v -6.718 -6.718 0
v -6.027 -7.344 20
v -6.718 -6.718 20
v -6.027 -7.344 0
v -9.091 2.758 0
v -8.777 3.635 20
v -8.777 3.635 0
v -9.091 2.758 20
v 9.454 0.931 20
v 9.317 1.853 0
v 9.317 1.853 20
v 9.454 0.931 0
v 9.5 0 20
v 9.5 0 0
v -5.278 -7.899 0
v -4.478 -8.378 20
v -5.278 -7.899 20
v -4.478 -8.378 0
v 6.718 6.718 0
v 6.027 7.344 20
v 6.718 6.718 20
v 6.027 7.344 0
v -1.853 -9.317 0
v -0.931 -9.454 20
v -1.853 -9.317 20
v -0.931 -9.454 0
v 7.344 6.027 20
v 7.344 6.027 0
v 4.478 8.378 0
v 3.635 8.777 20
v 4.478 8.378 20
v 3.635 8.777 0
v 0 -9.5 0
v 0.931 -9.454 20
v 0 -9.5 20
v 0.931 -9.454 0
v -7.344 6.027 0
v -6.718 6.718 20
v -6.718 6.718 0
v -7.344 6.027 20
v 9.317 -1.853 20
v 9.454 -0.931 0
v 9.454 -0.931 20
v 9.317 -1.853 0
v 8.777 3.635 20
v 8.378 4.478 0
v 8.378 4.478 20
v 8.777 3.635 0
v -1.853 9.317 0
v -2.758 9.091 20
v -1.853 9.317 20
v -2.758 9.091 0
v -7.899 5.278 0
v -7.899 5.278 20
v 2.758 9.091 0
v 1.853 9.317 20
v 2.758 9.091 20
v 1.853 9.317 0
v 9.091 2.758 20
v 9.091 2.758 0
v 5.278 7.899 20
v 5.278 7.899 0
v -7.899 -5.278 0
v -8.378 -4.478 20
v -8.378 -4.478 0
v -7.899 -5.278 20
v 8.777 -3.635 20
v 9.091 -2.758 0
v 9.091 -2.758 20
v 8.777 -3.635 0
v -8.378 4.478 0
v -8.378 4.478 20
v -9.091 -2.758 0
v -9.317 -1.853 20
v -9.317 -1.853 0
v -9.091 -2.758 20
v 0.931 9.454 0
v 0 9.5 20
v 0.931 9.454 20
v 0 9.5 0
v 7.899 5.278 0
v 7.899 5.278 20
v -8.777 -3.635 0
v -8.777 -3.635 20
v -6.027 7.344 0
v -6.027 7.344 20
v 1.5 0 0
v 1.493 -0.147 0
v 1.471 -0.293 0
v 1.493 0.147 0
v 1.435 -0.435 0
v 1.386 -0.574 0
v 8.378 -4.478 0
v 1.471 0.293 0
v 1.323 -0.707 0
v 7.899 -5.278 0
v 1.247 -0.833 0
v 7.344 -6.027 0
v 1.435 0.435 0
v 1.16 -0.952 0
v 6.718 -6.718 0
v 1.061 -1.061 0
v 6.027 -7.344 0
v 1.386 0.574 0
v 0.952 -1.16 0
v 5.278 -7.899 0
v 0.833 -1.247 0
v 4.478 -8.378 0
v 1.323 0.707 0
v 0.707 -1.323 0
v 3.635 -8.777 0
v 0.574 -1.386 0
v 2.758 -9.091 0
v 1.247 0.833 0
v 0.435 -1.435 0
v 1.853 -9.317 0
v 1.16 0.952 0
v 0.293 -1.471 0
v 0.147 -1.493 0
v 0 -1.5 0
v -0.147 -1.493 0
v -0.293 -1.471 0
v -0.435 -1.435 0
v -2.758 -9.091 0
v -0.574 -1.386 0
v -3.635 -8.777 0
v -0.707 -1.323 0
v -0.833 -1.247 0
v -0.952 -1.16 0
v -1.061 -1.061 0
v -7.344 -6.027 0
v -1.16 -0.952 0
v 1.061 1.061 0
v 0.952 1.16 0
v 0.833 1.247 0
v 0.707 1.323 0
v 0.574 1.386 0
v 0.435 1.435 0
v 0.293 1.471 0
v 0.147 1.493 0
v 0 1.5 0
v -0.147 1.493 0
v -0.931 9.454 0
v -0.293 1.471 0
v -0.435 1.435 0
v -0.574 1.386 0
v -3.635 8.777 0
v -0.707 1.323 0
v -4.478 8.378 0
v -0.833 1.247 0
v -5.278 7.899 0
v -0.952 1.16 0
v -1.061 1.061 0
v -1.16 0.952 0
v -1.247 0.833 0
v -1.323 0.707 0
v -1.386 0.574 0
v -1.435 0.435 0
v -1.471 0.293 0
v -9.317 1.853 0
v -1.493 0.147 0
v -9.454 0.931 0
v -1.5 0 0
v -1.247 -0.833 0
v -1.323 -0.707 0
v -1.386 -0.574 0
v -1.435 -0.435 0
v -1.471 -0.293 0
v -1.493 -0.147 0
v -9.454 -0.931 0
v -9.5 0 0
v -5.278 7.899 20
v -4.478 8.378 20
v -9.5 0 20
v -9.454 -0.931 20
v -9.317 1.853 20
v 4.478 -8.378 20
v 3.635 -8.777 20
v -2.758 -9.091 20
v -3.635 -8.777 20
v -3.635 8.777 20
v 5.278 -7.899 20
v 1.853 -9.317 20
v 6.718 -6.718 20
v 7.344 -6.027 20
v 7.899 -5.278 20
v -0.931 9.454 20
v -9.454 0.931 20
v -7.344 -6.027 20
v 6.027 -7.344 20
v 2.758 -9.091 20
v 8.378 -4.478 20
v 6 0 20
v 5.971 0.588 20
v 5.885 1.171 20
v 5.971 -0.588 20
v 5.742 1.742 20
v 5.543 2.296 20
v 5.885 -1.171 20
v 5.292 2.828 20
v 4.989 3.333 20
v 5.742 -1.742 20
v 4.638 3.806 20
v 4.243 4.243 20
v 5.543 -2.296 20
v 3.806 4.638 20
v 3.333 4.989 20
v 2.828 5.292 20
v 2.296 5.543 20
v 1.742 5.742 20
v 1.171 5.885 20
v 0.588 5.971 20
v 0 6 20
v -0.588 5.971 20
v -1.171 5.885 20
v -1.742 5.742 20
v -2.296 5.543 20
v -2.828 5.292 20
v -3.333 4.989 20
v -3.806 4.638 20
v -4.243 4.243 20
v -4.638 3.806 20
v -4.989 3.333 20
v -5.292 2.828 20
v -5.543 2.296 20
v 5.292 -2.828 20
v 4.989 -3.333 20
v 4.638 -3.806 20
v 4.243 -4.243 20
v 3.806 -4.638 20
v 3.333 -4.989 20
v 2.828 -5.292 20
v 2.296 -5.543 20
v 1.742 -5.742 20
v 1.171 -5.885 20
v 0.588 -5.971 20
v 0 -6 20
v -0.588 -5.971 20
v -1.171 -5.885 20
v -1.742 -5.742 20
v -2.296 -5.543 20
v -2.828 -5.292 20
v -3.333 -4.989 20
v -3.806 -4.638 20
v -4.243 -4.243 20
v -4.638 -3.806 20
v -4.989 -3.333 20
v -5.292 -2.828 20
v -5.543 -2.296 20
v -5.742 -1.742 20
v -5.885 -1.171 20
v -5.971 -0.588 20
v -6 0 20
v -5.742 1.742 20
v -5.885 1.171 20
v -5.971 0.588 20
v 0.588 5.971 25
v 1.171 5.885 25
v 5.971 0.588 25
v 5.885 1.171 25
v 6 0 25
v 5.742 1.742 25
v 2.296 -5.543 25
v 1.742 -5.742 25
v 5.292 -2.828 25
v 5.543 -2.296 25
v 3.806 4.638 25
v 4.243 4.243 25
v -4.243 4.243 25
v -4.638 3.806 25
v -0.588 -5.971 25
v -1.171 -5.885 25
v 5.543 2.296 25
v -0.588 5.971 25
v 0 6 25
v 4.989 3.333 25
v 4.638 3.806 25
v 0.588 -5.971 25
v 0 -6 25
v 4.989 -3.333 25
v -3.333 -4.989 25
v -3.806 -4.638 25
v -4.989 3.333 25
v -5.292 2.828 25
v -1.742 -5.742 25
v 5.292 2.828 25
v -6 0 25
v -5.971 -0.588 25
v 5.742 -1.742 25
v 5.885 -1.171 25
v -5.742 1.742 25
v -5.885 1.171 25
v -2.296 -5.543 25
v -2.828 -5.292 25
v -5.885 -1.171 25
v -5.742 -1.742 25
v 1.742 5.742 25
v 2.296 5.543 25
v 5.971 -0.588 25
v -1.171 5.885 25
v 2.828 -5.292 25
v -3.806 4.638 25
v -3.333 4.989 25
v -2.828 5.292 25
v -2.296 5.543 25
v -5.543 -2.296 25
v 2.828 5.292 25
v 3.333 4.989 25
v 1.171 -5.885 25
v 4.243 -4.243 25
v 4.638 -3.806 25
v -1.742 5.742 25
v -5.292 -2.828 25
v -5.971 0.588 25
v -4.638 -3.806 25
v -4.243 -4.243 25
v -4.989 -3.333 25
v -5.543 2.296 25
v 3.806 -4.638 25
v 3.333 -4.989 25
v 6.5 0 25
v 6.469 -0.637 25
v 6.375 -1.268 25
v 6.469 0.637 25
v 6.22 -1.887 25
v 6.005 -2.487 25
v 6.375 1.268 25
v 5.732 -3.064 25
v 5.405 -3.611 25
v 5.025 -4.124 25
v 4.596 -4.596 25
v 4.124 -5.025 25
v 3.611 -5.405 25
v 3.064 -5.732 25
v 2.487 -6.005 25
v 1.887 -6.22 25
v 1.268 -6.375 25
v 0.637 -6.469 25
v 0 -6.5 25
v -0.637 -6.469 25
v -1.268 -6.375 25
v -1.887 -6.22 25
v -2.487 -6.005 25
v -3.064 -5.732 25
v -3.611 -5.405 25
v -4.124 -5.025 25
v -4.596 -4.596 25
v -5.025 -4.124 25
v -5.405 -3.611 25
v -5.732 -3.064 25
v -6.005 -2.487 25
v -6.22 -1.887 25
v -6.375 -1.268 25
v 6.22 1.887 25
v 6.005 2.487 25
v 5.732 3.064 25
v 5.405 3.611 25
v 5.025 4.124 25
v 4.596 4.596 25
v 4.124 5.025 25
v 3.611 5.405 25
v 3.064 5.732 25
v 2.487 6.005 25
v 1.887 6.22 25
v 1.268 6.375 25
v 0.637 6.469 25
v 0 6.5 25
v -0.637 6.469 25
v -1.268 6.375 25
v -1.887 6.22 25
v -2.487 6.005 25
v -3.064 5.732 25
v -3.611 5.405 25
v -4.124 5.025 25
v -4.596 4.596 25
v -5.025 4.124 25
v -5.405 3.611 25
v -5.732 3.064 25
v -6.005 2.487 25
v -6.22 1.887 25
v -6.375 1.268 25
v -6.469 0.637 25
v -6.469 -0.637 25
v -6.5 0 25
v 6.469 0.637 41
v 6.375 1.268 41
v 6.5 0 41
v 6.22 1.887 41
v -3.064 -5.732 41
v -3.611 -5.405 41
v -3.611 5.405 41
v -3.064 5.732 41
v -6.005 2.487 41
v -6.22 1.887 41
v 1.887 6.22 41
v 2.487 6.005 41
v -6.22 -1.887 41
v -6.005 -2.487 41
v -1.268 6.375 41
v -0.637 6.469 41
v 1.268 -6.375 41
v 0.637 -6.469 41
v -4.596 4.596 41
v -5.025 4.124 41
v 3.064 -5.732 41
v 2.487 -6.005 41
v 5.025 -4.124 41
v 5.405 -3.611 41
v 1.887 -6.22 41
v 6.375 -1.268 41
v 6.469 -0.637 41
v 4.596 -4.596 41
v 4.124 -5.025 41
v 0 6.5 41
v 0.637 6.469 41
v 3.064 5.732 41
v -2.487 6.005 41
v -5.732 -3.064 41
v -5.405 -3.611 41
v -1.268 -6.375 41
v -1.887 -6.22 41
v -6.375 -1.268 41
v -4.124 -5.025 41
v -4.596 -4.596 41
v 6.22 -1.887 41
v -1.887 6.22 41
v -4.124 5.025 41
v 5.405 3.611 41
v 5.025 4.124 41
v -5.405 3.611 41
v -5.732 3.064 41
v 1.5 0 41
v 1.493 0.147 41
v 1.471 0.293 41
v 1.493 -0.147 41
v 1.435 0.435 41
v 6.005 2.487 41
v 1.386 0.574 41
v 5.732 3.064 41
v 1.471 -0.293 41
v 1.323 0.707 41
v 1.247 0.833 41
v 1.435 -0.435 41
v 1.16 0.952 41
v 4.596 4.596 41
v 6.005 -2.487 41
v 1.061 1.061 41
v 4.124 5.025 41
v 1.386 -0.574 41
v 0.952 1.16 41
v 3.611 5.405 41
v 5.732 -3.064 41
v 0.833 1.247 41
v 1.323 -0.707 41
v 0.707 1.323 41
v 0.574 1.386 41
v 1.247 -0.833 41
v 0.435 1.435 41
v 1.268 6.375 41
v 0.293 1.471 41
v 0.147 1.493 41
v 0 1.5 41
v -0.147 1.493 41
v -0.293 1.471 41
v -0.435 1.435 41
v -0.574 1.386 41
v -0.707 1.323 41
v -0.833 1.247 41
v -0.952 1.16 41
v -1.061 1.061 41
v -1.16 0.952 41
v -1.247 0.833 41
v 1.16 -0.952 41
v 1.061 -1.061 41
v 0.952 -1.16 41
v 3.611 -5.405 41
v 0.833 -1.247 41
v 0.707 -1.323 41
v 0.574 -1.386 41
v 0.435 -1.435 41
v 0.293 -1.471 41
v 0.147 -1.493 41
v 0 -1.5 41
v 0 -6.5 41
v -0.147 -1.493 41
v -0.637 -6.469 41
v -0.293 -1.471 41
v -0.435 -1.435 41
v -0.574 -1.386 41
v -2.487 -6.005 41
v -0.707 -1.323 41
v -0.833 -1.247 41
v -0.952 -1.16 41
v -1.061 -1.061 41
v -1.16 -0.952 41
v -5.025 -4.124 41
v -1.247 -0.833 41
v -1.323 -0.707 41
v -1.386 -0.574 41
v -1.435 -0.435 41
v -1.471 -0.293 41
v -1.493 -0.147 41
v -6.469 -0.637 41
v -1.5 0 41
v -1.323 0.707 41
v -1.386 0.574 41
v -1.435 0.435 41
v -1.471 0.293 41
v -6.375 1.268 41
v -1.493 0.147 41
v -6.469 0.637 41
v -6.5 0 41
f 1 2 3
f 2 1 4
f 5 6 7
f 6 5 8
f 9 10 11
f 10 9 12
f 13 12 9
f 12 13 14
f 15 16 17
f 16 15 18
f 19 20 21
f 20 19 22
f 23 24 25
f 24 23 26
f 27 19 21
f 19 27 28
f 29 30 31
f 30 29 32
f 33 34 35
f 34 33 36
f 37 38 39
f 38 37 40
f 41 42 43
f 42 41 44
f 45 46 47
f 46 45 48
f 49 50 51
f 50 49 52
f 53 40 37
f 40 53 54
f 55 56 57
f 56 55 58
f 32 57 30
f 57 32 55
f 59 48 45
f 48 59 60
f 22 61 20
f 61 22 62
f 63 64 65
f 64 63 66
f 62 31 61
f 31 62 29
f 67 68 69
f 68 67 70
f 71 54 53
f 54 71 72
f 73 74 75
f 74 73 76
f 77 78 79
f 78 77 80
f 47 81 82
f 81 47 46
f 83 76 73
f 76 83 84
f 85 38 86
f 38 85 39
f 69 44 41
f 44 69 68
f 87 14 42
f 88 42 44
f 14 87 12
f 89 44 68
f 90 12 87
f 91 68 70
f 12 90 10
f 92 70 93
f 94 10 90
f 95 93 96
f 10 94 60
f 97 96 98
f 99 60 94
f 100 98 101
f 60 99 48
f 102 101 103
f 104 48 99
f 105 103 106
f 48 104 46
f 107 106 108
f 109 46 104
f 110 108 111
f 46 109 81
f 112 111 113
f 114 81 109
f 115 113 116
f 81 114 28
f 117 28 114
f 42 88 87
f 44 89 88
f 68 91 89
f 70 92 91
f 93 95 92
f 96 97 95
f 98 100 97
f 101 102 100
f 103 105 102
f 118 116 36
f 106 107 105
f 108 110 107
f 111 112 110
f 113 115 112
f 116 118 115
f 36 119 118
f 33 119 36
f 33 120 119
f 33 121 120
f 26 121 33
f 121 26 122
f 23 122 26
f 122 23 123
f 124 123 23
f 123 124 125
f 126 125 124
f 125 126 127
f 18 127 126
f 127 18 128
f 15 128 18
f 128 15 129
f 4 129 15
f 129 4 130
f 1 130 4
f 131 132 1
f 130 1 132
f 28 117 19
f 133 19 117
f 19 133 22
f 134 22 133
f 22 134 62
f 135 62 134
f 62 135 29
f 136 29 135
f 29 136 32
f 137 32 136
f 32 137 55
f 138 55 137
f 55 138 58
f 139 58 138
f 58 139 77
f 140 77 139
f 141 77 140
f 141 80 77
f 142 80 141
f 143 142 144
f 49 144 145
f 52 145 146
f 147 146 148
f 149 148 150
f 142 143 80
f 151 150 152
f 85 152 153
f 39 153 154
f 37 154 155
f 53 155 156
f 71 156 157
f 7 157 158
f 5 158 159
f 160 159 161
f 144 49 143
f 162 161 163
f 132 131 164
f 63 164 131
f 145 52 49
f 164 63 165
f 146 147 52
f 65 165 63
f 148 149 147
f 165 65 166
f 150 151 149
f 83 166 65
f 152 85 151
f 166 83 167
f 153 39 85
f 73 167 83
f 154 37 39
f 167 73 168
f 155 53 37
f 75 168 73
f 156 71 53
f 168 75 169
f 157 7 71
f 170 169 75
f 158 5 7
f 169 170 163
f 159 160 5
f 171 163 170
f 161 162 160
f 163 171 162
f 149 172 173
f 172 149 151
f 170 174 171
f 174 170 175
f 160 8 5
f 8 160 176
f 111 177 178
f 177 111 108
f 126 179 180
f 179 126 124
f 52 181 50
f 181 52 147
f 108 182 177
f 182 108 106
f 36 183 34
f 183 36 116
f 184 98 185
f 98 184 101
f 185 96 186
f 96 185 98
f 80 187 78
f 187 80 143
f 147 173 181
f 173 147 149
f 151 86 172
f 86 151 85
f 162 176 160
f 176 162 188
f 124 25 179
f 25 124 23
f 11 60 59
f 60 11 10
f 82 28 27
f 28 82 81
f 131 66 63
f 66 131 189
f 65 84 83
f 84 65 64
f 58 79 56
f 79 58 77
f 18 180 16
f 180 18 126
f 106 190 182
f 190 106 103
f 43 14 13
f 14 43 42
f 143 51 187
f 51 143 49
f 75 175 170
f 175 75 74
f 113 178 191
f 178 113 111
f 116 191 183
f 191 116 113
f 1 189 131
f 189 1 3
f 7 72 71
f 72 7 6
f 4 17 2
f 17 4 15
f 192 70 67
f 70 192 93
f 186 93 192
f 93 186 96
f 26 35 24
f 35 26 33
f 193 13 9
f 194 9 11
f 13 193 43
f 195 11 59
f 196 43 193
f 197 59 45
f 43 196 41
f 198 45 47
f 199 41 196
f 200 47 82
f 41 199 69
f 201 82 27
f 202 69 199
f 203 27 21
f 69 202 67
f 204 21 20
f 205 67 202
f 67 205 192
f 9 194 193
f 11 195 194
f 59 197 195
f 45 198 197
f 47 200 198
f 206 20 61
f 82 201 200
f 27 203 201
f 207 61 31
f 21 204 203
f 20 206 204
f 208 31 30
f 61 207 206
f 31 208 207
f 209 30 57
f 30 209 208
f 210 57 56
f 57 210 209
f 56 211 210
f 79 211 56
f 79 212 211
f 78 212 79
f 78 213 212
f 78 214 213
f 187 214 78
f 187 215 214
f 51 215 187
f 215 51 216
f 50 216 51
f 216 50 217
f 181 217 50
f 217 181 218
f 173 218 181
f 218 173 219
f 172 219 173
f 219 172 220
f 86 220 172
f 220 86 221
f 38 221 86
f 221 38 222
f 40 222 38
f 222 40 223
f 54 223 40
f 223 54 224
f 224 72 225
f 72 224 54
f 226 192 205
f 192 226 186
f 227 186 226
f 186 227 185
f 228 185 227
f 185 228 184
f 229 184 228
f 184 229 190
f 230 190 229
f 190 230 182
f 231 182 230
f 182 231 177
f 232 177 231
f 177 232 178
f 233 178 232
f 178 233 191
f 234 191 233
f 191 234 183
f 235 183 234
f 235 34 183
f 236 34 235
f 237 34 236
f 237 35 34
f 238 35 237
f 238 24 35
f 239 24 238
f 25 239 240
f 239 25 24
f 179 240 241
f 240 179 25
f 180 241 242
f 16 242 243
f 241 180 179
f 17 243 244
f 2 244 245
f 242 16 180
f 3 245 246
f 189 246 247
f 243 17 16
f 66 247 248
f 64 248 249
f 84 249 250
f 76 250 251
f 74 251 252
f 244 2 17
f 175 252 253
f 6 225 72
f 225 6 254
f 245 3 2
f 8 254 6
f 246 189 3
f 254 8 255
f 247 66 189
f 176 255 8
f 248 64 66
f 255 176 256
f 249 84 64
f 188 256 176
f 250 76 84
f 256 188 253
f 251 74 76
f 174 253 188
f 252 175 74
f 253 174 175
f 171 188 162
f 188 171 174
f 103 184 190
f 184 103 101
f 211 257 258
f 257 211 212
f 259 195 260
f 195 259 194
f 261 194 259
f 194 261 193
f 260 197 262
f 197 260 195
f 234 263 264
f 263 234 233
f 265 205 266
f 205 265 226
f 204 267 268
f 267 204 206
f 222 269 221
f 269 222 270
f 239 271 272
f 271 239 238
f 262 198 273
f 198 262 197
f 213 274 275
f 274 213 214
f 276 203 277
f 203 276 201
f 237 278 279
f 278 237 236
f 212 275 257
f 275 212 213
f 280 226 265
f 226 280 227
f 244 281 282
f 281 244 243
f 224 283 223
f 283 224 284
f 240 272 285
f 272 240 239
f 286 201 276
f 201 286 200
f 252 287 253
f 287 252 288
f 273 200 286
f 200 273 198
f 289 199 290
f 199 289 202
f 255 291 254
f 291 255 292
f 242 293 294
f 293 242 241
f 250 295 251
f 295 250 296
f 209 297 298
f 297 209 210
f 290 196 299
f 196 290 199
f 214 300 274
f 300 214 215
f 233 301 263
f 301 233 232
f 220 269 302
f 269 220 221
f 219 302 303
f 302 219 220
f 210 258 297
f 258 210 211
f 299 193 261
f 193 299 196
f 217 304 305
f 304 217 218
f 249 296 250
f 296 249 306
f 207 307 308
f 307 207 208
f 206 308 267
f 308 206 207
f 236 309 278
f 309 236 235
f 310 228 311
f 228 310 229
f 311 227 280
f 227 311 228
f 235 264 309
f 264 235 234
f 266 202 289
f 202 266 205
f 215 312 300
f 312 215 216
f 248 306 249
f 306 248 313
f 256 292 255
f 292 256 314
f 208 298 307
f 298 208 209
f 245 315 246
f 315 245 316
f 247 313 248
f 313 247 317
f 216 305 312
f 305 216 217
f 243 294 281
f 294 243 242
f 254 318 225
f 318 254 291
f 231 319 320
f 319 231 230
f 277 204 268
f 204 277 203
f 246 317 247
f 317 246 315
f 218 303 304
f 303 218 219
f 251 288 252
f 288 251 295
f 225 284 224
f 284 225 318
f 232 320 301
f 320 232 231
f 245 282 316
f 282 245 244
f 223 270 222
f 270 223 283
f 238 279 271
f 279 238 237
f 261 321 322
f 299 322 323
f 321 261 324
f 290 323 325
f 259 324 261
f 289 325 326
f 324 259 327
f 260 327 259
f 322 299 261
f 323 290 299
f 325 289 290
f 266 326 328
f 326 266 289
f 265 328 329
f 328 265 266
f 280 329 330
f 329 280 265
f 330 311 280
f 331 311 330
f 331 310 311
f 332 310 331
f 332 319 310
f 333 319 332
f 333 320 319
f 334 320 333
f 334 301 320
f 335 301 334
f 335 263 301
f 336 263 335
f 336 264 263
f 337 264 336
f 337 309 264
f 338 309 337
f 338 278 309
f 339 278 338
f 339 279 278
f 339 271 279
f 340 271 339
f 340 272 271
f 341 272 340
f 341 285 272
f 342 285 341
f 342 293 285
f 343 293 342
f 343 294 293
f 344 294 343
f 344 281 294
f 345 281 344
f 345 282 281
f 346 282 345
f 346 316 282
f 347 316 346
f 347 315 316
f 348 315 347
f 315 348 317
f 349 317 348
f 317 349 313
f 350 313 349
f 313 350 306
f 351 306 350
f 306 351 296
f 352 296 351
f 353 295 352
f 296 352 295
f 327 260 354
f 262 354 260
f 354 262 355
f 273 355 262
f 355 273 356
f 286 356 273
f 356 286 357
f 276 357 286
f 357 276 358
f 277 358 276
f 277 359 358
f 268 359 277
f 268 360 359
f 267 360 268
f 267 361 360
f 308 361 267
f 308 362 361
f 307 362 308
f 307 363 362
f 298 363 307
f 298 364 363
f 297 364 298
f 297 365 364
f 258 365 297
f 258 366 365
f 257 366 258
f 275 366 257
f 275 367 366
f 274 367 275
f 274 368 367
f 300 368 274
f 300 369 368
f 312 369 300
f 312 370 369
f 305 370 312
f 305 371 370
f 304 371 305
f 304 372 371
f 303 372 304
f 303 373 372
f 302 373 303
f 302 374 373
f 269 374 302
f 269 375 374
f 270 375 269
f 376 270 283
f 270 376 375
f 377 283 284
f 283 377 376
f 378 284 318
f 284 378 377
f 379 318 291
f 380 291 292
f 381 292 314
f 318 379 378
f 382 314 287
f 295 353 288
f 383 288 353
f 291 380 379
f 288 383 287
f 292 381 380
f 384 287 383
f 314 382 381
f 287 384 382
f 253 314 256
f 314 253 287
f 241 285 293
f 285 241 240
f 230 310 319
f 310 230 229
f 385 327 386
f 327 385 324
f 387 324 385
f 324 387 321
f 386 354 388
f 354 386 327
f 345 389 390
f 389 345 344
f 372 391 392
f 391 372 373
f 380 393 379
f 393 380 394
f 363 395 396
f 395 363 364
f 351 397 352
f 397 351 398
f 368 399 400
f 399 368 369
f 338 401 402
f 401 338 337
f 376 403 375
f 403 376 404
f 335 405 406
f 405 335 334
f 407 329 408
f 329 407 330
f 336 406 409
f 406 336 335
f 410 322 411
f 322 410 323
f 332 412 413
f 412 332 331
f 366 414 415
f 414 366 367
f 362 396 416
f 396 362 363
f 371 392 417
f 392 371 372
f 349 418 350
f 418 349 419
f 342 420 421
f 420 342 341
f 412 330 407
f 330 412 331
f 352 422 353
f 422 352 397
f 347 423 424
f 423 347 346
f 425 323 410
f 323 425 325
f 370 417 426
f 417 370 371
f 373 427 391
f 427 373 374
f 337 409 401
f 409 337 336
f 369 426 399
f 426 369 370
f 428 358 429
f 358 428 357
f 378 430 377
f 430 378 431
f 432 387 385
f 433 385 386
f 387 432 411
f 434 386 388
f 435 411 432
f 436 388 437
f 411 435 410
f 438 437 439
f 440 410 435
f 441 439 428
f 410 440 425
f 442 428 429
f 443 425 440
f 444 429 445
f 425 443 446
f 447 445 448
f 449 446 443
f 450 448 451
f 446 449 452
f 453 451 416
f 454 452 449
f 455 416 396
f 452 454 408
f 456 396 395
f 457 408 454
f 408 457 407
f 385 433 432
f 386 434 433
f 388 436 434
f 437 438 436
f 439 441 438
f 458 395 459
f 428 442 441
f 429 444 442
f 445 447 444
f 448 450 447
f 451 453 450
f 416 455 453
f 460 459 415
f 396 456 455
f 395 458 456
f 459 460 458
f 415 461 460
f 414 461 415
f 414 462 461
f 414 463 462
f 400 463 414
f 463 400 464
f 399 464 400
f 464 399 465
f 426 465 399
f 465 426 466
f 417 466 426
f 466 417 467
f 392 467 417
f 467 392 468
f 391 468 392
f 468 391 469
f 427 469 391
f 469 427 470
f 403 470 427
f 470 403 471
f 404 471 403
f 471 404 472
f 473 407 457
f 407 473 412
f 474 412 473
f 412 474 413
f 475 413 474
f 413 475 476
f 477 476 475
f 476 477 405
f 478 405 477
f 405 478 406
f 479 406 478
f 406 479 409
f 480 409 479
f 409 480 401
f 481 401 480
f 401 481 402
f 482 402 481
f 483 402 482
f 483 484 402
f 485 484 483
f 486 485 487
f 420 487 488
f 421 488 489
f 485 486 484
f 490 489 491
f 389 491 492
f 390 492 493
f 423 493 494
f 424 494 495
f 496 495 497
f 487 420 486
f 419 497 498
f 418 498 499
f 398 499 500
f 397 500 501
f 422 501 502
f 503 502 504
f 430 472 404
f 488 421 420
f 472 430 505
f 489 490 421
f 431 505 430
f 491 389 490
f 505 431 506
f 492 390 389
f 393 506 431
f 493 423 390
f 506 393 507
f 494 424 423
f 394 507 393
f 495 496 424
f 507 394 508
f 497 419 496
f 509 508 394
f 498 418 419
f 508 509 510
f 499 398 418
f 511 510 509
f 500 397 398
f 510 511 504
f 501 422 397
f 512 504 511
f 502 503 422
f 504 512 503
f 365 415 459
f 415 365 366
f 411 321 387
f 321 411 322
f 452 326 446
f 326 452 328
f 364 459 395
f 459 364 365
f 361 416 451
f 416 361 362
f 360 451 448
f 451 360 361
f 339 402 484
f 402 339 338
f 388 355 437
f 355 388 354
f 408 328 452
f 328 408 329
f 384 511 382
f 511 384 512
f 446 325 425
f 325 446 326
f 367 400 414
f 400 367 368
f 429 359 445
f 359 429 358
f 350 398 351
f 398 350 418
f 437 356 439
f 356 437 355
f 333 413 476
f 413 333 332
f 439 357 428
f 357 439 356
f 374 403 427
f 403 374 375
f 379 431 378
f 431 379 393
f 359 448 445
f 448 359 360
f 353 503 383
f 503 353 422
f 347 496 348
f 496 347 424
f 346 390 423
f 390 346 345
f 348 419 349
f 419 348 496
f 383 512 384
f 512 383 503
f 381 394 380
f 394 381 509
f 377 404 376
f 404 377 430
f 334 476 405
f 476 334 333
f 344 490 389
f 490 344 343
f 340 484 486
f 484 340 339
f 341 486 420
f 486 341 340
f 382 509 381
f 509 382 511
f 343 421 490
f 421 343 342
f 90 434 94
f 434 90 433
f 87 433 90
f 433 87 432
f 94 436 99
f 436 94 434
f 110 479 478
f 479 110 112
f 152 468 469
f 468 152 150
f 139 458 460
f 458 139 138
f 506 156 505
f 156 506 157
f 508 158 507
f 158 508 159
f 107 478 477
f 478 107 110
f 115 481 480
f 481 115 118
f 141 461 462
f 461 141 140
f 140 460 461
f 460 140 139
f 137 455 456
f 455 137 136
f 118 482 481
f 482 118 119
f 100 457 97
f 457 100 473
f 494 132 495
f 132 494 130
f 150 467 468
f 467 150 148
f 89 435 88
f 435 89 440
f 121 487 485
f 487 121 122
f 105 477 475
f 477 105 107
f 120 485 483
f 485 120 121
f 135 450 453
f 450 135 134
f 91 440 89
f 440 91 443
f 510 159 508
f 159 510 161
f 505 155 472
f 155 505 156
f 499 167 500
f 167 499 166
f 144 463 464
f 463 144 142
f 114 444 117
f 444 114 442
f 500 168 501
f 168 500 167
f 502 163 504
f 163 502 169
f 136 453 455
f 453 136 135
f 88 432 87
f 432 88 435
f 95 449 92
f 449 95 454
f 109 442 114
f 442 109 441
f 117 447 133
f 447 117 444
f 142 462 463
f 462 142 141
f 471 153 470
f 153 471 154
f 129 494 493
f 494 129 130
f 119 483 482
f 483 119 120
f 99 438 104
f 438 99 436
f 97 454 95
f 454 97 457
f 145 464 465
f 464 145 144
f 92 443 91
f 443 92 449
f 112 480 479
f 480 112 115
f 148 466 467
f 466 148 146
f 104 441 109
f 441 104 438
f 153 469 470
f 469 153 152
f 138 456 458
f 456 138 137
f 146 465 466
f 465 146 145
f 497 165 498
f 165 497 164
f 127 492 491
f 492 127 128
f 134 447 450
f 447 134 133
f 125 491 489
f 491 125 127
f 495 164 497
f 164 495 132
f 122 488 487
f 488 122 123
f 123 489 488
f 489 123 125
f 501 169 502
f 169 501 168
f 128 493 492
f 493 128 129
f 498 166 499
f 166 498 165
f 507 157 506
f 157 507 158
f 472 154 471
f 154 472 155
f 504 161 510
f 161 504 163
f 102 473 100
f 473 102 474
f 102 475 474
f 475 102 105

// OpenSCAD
$fn = 64;

// --- Dimensions (mm) ---
// Bore (inner diameter)
bore_diameter = 3.0;

// --- 8 mm Tubing Section (z = 0 to 20) ---
// Barb 1 (Bottom)
barb1_height = 10.0;
barb1_od_bottom = 7.5;
barb1_od_top = 9.5;
barb1_od_step = 7.5; // Steps back to this diameter

// --- Transition Section (z = 20 to 25) ---
collar_diameter = 12.0;
collar_height = 5.0;

// --- 5 mm Tubing Section (z = 25 to 41) ---
// Barb 2 (Top)
barb2_height = 8.0;
barb2_od_bottom = 6.5;
barb2_od_top = 5.0;
barb2_od_step = 6.5; // Steps back to this diameter

// --- Geometry Generation ---

// 1. Main Body (Cylinder with Bore)
// We construct the body as a union of the outer shape and the inner bore.
// The outer shape is built by stacking the sections described.

module main_body() {
    union() {
        // Section 1: Bottom 8mm Barbs (z = 0 to 20)
        translate([0, 0, 0])
        cylinder(h = 20, r = 9.5, $fn = 64);
        
        // Section 2: Transition Collar (z = 20 to 25)
        translate([0, 0, 20])
        cylinder(h = collar_height, r = collar_diameter / 2, $fn = 64);
        
        // Section 3: Top 5mm Barbs (z = 25 to 41)
        translate([0, 0, 25])
        cylinder(h = 16, r = 6.5, $fn = 64);
    }
}

module inner_bore() {
    // The bore is a straight cylinder through the full length
    cylinder(h = 41, r = bore_diameter / 2, $fn = 64);
}

// 2. Sawtooth Barbs
// Generates a single sawtooth profile: Linear ramp up, then step down
module sawtooth_barb(z_start, height, od_bottom, od_top, od_step) {
    // The linear ramp (bottom to top)
    // We use a cylinder with a linearly interpolated radius
    // To do this in OpenSCAD without CSG hacks, we use a linear_extrude
    // of a polygon that interpolates the radius.
    
    // Calculate radius at top
    r_top = od_top / 2;
    r_bottom = od_bottom / 2;
    
    // Create a polygon for the cross section
    // We use a polygon with 4 points: Bottom-Left, Top-Left, Top-Right, Bottom-Right
    // The X coordinates represent the radius at that Z height.
    // We need to scale the polygon in X based on the Z height.
    
    // However, linear_extrude scales the whole shape. 
    // To get a linear change in radius, we can use a polygon with a varying X coordinate
    // and scale it in X using the 'scale' vector in linear_extrude.
    
    // Let's define the shape in 2D (y is up, x is out)
    // We want the radius to go from r_bottom to r_top over 'height'.
    // We can use a polygon that is a trapezoid, then scale it in X.
    
    // Shape: A trapezoid where the top edge is shorter than the bottom edge.
    // But we need to scale it so the top edge becomes r_top.
    // Let's define the shape with a top edge of length 2*r_top.
    // Then we scale it in X by (r_bottom / r_top).
    
    // Wait, simpler approach: 
    // Use a cylinder for the ramp, and a cylinder for the step.
    
    // Ramp (Linear growth)
    // We can't easily make a cylinder with a changing radius in one go.
    // We can use a polygon and linear_extrude with a scale vector.
    
    // Polygon points (relative to center):
    // 0,0 (bottom center)
    // 0, height (top center)
    // r_top, height (top edge)
    // r_bottom, 0 (bottom edge)
    
    // We need to scale this shape in X so that the bottom edge becomes r_bottom.
    // Scale factor = r_bottom / r_top.
    
    scale_factor = r_bottom / r_top;
    
    linear_extrude(height = height, scale = scale_factor) {
        polygon([
            [0, 0],
            [0, 1],
            [r_top, 1],
            [r_bottom, 0]
        ]);
    }
    
    // Step (Straight back to bottom diameter)
    // We add a cylinder on top of the ramp.
    // The ramp ends at z_start + height.
    // The step starts at z_start + height.
    // The step height is small (e.g., 0.1 mm) to ensure a solid connection.
    
    step_height = 0.1;
    
    translate([0, 0, height])
    cylinder(h = step_height, r = od_step / 2, $fn = 64);
}

// 3. Assembly
// Render the part
difference() {
    main_body();
    inner_bore();
}

// 4. Add Barbs
// We add the barbs to the main body.
// We need to add them to the 'main_body' module or union them.
// Since we are using difference, we can just union the barbs with the main body
// before subtracting the bore.

module full_part() {
    difference() {
        union() {
            main_body();
            
            // Add Bottom Barbs (z = 0 to 10)
            // We place them at z=0.
            // The module draws from z=0 to z=height.
            translate([0, 0, 0])
            sawtooth_barb(0, barb1_height, barb1_od_bottom, barb1_od_top, barb1_od_step);
            
            // Add Top Barbs (z = 25 to 33)
            // We place them at z=25.
            translate([0, 0, 25])
            sawtooth_barb(0, barb2_height, barb2_od_bottom, barb2_od_top, barb2_od_step);
        }
        inner_bore();
    }
}

// Render the final part
full_part();
